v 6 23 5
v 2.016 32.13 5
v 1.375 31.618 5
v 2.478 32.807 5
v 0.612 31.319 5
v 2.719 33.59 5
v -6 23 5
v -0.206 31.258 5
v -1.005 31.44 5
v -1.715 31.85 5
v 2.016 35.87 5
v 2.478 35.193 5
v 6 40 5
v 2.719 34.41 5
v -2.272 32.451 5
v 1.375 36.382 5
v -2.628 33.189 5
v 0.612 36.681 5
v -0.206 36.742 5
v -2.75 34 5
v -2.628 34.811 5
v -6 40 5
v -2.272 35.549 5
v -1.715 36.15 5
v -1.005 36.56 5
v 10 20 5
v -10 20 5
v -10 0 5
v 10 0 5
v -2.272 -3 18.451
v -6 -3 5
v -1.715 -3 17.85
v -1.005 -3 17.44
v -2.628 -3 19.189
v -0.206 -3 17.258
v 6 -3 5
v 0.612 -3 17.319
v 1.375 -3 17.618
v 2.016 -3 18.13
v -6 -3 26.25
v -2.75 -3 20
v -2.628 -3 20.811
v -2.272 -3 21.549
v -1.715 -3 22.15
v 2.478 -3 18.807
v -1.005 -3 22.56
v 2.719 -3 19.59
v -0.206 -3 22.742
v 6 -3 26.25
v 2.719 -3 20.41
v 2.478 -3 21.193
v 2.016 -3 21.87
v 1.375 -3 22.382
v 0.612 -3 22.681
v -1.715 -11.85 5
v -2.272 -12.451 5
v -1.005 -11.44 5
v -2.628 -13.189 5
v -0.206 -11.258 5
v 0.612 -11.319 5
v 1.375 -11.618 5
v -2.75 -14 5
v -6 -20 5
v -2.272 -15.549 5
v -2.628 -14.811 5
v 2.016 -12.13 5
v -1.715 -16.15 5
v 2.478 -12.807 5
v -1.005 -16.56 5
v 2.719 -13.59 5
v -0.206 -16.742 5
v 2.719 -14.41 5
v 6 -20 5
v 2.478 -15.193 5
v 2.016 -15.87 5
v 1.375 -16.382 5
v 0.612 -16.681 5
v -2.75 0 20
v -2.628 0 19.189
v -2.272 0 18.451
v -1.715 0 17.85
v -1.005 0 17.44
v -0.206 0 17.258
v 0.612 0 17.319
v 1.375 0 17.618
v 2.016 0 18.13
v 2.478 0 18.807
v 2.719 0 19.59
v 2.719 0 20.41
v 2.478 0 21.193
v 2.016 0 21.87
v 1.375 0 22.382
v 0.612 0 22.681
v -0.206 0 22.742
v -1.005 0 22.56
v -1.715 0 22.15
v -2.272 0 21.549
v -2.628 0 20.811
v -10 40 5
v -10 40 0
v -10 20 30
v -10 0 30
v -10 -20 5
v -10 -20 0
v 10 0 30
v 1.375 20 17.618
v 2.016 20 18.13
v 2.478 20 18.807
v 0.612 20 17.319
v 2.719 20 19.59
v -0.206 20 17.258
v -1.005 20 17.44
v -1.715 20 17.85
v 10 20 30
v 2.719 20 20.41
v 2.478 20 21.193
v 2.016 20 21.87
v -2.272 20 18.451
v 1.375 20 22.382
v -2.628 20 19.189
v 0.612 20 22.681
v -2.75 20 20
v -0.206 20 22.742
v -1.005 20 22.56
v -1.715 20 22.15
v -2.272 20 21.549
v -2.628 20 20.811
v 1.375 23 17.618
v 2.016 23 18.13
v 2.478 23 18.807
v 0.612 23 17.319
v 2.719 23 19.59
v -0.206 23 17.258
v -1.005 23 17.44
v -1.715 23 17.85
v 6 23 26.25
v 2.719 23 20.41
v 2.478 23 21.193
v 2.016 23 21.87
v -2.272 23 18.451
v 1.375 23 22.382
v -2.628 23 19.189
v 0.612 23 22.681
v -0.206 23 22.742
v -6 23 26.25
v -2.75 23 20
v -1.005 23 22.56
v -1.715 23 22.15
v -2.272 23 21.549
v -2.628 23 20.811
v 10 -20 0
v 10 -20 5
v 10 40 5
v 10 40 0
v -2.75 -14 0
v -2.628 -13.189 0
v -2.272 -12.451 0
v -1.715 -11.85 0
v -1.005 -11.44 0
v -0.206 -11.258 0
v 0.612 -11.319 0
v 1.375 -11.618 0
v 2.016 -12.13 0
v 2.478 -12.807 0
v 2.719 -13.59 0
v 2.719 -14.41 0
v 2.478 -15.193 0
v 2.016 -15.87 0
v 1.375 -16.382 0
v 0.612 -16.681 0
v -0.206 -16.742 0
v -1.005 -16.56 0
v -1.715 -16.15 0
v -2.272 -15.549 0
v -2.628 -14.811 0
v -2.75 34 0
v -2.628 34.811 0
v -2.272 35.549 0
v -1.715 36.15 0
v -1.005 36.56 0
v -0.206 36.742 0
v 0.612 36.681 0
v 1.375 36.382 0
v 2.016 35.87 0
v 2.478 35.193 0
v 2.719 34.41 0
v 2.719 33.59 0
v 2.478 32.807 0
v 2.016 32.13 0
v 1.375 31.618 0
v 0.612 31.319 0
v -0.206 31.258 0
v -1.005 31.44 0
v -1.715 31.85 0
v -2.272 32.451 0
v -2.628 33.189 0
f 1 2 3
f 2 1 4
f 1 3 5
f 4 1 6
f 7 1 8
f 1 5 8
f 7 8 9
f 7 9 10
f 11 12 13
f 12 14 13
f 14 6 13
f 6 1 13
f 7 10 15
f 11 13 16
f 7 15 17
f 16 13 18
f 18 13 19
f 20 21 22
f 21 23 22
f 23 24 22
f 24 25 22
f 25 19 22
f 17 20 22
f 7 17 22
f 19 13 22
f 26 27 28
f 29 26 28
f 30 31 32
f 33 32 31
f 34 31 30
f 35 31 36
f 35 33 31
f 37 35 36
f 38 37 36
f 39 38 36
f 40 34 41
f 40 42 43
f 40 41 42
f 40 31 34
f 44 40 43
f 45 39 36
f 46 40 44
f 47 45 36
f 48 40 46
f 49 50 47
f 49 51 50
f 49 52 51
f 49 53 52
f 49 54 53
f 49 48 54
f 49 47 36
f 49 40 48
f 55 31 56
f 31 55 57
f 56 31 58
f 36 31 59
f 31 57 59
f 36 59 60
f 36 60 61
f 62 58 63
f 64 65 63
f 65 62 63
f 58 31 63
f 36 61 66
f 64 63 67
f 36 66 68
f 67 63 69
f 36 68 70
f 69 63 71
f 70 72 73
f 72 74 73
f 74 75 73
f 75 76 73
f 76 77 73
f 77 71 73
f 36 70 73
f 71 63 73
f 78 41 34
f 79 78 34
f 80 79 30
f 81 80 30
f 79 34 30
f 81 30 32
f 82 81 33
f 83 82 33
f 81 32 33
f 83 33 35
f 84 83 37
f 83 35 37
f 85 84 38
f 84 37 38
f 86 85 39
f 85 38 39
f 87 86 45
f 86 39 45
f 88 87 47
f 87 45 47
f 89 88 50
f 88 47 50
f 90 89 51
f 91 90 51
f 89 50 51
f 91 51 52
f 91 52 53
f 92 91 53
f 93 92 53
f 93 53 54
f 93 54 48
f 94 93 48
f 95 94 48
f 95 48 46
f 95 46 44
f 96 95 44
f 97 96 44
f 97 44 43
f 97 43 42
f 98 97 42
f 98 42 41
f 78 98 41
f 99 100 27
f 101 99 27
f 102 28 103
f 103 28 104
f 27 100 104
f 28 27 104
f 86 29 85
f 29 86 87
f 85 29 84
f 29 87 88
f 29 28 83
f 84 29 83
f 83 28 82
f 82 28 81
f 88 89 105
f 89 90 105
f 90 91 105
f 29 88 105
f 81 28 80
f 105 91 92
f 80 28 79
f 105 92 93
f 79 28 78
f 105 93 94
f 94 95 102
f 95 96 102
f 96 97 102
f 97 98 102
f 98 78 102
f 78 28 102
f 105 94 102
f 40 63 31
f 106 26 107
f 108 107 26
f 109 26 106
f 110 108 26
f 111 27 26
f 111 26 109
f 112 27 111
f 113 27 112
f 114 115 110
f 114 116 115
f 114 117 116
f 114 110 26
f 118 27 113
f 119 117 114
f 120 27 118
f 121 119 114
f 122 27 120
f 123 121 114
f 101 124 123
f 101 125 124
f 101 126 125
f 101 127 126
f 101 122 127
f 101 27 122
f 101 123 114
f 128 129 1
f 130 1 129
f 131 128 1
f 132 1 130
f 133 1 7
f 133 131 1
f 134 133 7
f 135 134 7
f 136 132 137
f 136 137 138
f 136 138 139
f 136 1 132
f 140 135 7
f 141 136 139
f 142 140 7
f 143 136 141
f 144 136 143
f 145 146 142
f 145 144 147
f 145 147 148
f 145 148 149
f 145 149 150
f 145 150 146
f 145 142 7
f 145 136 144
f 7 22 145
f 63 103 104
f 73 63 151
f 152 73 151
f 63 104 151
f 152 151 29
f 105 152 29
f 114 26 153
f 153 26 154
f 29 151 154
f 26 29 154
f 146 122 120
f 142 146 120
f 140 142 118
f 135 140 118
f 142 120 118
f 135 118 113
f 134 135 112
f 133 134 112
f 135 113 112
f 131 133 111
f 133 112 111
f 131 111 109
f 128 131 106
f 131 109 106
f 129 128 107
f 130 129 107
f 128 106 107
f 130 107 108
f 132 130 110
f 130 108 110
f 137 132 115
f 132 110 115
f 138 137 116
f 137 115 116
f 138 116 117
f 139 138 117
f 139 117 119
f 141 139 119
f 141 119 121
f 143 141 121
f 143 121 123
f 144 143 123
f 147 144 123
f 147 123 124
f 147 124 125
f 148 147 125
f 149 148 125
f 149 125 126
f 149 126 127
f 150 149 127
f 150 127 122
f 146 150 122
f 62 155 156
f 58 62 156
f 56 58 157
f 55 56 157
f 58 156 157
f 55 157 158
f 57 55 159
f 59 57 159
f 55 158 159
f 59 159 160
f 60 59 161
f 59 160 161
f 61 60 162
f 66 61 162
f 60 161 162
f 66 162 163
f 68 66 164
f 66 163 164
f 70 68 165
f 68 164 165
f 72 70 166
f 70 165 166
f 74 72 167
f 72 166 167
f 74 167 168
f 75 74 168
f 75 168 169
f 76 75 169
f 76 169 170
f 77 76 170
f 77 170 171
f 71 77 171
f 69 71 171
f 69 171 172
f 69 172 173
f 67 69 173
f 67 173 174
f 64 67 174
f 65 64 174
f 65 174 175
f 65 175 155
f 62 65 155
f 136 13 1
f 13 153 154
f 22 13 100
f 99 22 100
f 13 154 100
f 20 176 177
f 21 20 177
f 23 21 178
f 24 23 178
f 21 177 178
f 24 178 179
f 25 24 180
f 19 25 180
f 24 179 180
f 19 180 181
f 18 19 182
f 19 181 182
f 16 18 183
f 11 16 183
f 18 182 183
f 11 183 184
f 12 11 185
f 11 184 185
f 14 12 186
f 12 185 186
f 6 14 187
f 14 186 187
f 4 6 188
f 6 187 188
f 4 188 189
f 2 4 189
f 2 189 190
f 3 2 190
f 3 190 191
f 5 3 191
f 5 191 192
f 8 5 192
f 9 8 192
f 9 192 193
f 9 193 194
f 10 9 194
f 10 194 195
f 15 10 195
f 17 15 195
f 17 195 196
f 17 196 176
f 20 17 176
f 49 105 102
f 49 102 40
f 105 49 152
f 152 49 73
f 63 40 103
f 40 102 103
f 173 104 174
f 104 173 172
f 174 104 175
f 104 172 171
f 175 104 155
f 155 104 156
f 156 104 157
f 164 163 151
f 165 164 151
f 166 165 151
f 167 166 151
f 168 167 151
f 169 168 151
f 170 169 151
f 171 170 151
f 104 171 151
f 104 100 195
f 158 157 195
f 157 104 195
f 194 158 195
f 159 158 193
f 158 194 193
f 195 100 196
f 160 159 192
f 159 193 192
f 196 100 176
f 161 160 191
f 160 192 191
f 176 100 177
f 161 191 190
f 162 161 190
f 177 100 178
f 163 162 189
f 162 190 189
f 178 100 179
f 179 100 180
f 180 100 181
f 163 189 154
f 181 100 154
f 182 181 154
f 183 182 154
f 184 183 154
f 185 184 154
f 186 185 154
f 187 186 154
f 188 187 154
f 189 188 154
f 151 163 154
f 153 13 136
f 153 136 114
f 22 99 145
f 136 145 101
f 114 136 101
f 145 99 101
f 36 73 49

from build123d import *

# Parameters (mm, degrees)
F1_DEPTH  = 30
F2_W      = 20
F2_H      = 25
F3_DEPTH  = 25
F5_W      = 12
F5_H      = 25
F6_DEPTH  = 17
F7_D      = 5.5
F7_DEPTH  = 40.001
F9_D      = 5.5
F10_W     = 12
F10_H     = 25
F11_DEPTH = 17
F13_D     = 5.5


with BuildPart() as f1:
    # F0 (on Top) → F1 (new body)
    with BuildSketch(Plane.XY):
        Polygon((-10, 20), (-10, 0), (-10, -20), (10, -20), (10, 0), (10, 20), (10, 40), (-10, 40), align=None)
    extrude(amount=F1_DEPTH)

    # F2 (on face) → F3 (cut)
    with BuildSketch(Plane(origin=(-10, 0, 0), x_dir=(0, -1, 0), z_dir=(-1, 0, 0))):
        Polygon((-40, 5), (-20, 30), (-40, 30), align=None)
        with Locations((-10, 17.5)):
            Rectangle(F2_W, F2_H)
        Polygon((20, 30), (0, 30), (20, 5), align=None)
    extrude(amount=-F3_DEPTH, mode=Mode.SUBTRACT)

    # F5 (on face) → F6 (cut)
    with BuildSketch(Plane(origin=(0, 40, 0), x_dir=(-1, 0, 0), z_dir=(0, 1, 0))):
        with Locations((0, 17.5)):
            Rectangle(F5_W, F5_H)
    extrude(amount=-F6_DEPTH, mode=Mode.SUBTRACT)

    # F7 (through all, one way)
    with BuildSketch(Plane(origin=(0, 0, 0), x_dir=(-1, 0, 0), z_dir=(0, -1, 0))):
        with Locations((0, -20)):
            Circle(F7_D / 2)
    extrude(amount=-F7_DEPTH, mode=Mode.SUBTRACT)

    # F9 (through all)
    with Locations(Plane(origin=(0, 20, 0), x_dir=(1, 0, 0), z_dir=(0, 1, 0))):
        with Locations((0, -20)):
            Hole(F9_D / 2)

    # F10 (on face) → F11 (cut)
    with BuildSketch(Plane.XZ.offset(20)):
        with Locations((0, 17.5)):
            Rectangle(F10_W, F10_H)
    extrude(amount=-F11_DEPTH, mode=Mode.SUBTRACT)

    # F13 (through all)
    with Locations(Plane.XY.offset(5)):
        with Locations((0, 34), (0, -14)):
            Hole(F13_D / 2)


solid = f1.part
